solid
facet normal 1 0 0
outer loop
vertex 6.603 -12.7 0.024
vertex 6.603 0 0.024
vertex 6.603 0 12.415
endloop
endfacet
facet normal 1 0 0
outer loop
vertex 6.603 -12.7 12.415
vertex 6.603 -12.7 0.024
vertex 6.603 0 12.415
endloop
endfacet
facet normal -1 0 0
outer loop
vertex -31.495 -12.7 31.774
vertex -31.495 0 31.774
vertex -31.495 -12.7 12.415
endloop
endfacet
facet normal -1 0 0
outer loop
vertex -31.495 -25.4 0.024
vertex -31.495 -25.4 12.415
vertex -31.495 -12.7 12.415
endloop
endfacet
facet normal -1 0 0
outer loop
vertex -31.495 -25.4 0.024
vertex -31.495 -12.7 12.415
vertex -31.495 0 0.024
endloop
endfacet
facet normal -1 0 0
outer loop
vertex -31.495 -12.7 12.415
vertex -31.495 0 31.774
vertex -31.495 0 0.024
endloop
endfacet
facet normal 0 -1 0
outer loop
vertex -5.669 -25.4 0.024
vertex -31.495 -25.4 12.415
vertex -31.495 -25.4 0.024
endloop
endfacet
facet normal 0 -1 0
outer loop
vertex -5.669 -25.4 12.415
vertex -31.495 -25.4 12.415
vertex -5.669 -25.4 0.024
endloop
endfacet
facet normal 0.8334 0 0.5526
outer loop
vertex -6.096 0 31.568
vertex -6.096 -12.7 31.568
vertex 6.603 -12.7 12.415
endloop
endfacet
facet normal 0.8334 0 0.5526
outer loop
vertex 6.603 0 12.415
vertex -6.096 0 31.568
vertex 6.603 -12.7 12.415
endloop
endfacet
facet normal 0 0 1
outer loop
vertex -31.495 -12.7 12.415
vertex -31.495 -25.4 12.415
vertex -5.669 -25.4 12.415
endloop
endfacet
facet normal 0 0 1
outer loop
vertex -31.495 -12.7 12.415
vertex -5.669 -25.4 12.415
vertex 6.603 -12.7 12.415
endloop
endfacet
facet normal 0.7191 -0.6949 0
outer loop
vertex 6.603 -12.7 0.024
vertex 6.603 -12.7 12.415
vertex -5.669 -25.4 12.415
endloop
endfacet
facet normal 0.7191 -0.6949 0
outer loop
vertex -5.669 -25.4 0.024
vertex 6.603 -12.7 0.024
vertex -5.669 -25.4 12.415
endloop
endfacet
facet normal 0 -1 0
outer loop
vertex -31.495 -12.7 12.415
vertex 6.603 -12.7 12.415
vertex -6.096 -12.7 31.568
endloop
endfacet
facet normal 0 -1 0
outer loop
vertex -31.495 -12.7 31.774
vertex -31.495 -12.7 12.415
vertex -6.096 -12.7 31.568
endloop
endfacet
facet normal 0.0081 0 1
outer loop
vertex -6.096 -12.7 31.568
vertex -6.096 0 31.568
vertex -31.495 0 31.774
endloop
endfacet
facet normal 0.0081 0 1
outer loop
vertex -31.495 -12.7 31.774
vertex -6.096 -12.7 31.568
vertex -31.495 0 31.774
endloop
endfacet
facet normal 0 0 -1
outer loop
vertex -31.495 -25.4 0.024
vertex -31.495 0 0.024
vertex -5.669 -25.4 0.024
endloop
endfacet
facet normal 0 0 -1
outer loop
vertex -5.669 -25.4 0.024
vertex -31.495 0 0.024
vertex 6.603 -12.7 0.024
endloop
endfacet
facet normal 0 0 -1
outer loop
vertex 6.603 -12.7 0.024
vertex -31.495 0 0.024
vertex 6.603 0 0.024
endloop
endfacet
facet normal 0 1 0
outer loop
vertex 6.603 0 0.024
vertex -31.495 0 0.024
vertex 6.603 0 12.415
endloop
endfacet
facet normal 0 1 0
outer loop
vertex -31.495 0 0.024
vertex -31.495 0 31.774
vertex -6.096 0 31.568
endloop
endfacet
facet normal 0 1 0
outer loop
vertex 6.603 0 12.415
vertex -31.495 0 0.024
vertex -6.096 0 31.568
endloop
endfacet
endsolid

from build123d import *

# Parameters (mm, degrees)
F1_DEPTH = 25.4
F2_W     = 12.7
F2_H     = 19.05
F3_DEPTH = 38.099740899
F4_W     = 38.1
F4_H     = 12.7
F5_DEPTH = 2.54
F7_DEPTH = 12.701
F9_DEPTH = 12.3912550856


with BuildPart() as f1:
    # F0 (on Front) → F1 (new body)
    with BuildSketch(Plane.XZ):
        Polygon((-31.4954862574, 31.774422986), (-31.4954862574, 0.024422986), (6.6032546415, 0.024422986), (6.6032546415, 31.4646780716), align=None)
    extrude(amount=F1_DEPTH)

    # F2 (on face) → F3 (cut, through all)
    with BuildSketch(Plane.YZ.offset(6.6032546415)):
        with Locations((-19.05, 21.9396780716)):
            Rectangle(F2_W, F2_H)
    extrude(amount=-F3_DEPTH, mode=Mode.SUBTRACT)

    # F4 (on face) → F5 (cut)
    with BuildSketch(Plane(origin=(0.2562291336, 0, 31.5162797473), x_dir=(0.9999669527, 0, -0.0081297878), z_dir=(0.0081297878, 0, 0.9999669527))):
        with Locations((-12.7027647333, -19.05)):
            Rectangle(F4_W, F4_H)
    extrude(amount=-F5_DEPTH, mode=Mode.SUBTRACT)

    # F6 (on face) → F7 (cut, through all)
    with BuildSketch(Plane.XZ.offset(12.7)):
        Polygon((-6.0963256581, 31.5679263764), (6.6032546415, 12.4146780716), (6.6032546415, 31.4646780716), align=None)
    extrude(amount=-F7_DEPTH, mode=Mode.SUBTRACT)

    # F8 (on face) → F9 (cut, through all)
    with BuildSketch(Plane.XY.offset(12.4146780716)):
        Polygon((6.6032546415, -25.4), (6.6032546415, -12.7), (-5.669398699, -25.4), align=None)
    extrude(amount=-F9_DEPTH, mode=Mode.SUBTRACT)


solid = f1.part
